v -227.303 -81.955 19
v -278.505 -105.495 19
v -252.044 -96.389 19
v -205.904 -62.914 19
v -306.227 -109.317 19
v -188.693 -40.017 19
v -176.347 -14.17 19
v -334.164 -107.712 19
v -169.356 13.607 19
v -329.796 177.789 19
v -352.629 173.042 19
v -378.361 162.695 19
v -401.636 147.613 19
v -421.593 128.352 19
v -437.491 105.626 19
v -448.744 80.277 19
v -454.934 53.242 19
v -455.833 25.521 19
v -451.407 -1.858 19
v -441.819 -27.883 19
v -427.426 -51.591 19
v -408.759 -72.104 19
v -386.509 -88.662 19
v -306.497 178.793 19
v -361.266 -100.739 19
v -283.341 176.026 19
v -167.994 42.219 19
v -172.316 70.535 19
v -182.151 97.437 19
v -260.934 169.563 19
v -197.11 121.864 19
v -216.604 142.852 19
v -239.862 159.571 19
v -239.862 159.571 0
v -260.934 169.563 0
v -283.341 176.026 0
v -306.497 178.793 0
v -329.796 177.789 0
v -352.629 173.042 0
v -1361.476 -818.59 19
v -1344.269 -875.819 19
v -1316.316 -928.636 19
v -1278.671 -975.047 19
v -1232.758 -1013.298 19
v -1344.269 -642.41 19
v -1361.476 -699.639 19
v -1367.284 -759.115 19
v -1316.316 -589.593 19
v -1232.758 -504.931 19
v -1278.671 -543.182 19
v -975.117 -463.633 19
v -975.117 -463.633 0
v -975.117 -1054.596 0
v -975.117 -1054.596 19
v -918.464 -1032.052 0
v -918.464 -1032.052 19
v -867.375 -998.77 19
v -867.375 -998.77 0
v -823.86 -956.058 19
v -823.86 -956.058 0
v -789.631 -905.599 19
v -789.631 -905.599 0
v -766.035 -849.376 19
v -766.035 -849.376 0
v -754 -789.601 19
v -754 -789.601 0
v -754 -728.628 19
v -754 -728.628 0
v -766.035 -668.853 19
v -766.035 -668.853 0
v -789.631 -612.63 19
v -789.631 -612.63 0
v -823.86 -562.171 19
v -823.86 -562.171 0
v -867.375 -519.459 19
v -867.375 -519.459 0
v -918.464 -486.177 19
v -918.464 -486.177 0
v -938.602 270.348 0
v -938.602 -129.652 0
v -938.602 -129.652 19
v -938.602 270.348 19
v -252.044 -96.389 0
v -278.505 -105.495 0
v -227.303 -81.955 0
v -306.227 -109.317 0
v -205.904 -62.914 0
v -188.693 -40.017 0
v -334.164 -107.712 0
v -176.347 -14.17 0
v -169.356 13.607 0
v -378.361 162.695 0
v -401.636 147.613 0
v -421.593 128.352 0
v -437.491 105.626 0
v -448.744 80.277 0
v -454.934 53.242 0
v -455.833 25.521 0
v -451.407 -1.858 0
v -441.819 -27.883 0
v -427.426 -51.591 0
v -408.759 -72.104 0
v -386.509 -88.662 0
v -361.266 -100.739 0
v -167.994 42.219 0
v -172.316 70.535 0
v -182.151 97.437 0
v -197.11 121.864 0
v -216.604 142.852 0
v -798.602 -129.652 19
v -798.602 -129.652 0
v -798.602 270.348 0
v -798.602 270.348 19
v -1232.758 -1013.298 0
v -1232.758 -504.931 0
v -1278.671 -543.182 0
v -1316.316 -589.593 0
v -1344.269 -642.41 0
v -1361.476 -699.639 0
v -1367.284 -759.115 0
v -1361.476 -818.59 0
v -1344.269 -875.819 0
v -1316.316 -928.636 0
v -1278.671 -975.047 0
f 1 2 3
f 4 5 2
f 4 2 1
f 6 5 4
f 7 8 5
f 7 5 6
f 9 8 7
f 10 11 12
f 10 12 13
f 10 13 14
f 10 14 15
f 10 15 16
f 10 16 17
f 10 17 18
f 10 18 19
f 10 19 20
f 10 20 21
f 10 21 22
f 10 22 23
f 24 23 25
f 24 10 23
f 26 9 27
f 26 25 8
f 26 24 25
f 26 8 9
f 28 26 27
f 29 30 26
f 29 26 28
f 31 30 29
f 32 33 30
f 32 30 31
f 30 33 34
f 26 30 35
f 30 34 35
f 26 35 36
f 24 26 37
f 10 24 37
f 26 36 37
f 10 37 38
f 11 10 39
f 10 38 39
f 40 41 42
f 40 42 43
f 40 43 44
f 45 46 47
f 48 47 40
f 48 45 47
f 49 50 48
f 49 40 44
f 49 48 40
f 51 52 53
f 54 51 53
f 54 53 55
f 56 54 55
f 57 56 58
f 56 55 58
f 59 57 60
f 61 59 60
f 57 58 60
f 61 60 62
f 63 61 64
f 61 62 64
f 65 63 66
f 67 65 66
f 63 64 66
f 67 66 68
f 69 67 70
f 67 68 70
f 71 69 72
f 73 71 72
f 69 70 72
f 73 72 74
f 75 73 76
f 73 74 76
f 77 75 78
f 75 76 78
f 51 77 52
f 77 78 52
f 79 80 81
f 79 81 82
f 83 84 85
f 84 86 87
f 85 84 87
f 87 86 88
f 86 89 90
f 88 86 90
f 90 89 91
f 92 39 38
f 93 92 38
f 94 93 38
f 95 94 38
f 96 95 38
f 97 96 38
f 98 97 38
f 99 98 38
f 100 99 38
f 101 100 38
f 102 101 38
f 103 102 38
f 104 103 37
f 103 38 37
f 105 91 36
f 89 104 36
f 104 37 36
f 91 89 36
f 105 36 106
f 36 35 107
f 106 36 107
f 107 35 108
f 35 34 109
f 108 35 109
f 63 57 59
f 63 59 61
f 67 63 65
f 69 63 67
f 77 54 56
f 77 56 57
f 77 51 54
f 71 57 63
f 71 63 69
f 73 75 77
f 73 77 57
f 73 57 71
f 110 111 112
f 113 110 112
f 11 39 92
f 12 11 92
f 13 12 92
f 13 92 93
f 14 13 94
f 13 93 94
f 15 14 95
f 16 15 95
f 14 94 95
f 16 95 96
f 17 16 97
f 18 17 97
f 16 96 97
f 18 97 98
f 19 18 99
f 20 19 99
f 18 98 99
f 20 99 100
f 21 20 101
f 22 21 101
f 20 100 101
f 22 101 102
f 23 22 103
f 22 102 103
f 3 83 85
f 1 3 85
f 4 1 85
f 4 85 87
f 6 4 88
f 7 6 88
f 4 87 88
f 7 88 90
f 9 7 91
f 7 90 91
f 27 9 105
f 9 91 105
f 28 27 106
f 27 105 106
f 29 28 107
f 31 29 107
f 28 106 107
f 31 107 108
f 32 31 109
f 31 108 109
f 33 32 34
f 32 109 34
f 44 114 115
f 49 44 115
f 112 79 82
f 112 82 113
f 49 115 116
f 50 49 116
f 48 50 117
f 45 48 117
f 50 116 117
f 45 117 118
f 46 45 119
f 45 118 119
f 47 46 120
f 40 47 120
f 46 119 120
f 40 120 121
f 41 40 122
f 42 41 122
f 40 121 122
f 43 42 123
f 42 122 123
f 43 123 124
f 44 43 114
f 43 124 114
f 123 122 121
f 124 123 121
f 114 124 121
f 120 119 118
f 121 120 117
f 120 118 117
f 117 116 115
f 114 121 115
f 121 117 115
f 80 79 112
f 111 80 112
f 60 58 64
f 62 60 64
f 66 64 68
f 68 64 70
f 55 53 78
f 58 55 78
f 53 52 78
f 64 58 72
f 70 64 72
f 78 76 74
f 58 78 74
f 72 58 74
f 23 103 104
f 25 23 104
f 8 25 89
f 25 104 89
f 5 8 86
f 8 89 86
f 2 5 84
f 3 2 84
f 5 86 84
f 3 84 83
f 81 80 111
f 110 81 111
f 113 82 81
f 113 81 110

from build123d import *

# Parameters (mm, degrees)
F3_DEPTH = 19
F4_DEPTH = 19
F5_W     = 140
F5_H     = 400
F6_DEPTH = 19


with BuildPart() as f3:
    # F2 (on face) → F3 (new body)
    with BuildSketch(Plane.XY):
        with BuildLine():
            ThreePointArc((-252.043999, -96.389451), (-167.962492, 27.878954), (-239.862328, 159.570829))
            ThreePointArc((-239.862328, 159.570829), (-294.863017, 177.878387), (-352.62851, 173.042022))
            ThreePointArc((-352.62851, 173.042022), (-454.934226, 53.241562), (-386.50929, -88.66206))
            ThreePointArc((-386.50929, -88.66206), (-320.23454, -109.194219), (-252.043999, -96.389451))
        make_face()
    extrude(amount=F3_DEPTH)


with BuildPart() as f4:
    # F1 (on face) → F4 (new body)
    with BuildSketch(Plane.XY):
        with BuildLine():
            Line((-1232.758152, -1013.298184), (-1232.758152, -504.930846))
            ThreePointArc((-1232.758152, -504.930846), (-1367.284269, -759.114515), (-1232.758152, -1013.298184))
        make_face()
        with BuildLine():
            ThreePointArc((-975.11674, -1054.595652), (-752.484585, -759.114515), (-975.11674, -463.633378))
            Line((-975.11674, -463.633378), (-975.11674, -1054.595652))
        make_face()
    extrude(amount=F4_DEPTH)


with BuildPart() as f6:
    # F5 (on Top) → F6 (new body)
    with BuildSketch(Plane.XY):
        with Locations((-868.602335, 70.347804)):
            Rectangle(F5_W, F5_H)
    extrude(amount=F6_DEPTH)


solid = Compound([f3.part, f4.part, f6.part])
